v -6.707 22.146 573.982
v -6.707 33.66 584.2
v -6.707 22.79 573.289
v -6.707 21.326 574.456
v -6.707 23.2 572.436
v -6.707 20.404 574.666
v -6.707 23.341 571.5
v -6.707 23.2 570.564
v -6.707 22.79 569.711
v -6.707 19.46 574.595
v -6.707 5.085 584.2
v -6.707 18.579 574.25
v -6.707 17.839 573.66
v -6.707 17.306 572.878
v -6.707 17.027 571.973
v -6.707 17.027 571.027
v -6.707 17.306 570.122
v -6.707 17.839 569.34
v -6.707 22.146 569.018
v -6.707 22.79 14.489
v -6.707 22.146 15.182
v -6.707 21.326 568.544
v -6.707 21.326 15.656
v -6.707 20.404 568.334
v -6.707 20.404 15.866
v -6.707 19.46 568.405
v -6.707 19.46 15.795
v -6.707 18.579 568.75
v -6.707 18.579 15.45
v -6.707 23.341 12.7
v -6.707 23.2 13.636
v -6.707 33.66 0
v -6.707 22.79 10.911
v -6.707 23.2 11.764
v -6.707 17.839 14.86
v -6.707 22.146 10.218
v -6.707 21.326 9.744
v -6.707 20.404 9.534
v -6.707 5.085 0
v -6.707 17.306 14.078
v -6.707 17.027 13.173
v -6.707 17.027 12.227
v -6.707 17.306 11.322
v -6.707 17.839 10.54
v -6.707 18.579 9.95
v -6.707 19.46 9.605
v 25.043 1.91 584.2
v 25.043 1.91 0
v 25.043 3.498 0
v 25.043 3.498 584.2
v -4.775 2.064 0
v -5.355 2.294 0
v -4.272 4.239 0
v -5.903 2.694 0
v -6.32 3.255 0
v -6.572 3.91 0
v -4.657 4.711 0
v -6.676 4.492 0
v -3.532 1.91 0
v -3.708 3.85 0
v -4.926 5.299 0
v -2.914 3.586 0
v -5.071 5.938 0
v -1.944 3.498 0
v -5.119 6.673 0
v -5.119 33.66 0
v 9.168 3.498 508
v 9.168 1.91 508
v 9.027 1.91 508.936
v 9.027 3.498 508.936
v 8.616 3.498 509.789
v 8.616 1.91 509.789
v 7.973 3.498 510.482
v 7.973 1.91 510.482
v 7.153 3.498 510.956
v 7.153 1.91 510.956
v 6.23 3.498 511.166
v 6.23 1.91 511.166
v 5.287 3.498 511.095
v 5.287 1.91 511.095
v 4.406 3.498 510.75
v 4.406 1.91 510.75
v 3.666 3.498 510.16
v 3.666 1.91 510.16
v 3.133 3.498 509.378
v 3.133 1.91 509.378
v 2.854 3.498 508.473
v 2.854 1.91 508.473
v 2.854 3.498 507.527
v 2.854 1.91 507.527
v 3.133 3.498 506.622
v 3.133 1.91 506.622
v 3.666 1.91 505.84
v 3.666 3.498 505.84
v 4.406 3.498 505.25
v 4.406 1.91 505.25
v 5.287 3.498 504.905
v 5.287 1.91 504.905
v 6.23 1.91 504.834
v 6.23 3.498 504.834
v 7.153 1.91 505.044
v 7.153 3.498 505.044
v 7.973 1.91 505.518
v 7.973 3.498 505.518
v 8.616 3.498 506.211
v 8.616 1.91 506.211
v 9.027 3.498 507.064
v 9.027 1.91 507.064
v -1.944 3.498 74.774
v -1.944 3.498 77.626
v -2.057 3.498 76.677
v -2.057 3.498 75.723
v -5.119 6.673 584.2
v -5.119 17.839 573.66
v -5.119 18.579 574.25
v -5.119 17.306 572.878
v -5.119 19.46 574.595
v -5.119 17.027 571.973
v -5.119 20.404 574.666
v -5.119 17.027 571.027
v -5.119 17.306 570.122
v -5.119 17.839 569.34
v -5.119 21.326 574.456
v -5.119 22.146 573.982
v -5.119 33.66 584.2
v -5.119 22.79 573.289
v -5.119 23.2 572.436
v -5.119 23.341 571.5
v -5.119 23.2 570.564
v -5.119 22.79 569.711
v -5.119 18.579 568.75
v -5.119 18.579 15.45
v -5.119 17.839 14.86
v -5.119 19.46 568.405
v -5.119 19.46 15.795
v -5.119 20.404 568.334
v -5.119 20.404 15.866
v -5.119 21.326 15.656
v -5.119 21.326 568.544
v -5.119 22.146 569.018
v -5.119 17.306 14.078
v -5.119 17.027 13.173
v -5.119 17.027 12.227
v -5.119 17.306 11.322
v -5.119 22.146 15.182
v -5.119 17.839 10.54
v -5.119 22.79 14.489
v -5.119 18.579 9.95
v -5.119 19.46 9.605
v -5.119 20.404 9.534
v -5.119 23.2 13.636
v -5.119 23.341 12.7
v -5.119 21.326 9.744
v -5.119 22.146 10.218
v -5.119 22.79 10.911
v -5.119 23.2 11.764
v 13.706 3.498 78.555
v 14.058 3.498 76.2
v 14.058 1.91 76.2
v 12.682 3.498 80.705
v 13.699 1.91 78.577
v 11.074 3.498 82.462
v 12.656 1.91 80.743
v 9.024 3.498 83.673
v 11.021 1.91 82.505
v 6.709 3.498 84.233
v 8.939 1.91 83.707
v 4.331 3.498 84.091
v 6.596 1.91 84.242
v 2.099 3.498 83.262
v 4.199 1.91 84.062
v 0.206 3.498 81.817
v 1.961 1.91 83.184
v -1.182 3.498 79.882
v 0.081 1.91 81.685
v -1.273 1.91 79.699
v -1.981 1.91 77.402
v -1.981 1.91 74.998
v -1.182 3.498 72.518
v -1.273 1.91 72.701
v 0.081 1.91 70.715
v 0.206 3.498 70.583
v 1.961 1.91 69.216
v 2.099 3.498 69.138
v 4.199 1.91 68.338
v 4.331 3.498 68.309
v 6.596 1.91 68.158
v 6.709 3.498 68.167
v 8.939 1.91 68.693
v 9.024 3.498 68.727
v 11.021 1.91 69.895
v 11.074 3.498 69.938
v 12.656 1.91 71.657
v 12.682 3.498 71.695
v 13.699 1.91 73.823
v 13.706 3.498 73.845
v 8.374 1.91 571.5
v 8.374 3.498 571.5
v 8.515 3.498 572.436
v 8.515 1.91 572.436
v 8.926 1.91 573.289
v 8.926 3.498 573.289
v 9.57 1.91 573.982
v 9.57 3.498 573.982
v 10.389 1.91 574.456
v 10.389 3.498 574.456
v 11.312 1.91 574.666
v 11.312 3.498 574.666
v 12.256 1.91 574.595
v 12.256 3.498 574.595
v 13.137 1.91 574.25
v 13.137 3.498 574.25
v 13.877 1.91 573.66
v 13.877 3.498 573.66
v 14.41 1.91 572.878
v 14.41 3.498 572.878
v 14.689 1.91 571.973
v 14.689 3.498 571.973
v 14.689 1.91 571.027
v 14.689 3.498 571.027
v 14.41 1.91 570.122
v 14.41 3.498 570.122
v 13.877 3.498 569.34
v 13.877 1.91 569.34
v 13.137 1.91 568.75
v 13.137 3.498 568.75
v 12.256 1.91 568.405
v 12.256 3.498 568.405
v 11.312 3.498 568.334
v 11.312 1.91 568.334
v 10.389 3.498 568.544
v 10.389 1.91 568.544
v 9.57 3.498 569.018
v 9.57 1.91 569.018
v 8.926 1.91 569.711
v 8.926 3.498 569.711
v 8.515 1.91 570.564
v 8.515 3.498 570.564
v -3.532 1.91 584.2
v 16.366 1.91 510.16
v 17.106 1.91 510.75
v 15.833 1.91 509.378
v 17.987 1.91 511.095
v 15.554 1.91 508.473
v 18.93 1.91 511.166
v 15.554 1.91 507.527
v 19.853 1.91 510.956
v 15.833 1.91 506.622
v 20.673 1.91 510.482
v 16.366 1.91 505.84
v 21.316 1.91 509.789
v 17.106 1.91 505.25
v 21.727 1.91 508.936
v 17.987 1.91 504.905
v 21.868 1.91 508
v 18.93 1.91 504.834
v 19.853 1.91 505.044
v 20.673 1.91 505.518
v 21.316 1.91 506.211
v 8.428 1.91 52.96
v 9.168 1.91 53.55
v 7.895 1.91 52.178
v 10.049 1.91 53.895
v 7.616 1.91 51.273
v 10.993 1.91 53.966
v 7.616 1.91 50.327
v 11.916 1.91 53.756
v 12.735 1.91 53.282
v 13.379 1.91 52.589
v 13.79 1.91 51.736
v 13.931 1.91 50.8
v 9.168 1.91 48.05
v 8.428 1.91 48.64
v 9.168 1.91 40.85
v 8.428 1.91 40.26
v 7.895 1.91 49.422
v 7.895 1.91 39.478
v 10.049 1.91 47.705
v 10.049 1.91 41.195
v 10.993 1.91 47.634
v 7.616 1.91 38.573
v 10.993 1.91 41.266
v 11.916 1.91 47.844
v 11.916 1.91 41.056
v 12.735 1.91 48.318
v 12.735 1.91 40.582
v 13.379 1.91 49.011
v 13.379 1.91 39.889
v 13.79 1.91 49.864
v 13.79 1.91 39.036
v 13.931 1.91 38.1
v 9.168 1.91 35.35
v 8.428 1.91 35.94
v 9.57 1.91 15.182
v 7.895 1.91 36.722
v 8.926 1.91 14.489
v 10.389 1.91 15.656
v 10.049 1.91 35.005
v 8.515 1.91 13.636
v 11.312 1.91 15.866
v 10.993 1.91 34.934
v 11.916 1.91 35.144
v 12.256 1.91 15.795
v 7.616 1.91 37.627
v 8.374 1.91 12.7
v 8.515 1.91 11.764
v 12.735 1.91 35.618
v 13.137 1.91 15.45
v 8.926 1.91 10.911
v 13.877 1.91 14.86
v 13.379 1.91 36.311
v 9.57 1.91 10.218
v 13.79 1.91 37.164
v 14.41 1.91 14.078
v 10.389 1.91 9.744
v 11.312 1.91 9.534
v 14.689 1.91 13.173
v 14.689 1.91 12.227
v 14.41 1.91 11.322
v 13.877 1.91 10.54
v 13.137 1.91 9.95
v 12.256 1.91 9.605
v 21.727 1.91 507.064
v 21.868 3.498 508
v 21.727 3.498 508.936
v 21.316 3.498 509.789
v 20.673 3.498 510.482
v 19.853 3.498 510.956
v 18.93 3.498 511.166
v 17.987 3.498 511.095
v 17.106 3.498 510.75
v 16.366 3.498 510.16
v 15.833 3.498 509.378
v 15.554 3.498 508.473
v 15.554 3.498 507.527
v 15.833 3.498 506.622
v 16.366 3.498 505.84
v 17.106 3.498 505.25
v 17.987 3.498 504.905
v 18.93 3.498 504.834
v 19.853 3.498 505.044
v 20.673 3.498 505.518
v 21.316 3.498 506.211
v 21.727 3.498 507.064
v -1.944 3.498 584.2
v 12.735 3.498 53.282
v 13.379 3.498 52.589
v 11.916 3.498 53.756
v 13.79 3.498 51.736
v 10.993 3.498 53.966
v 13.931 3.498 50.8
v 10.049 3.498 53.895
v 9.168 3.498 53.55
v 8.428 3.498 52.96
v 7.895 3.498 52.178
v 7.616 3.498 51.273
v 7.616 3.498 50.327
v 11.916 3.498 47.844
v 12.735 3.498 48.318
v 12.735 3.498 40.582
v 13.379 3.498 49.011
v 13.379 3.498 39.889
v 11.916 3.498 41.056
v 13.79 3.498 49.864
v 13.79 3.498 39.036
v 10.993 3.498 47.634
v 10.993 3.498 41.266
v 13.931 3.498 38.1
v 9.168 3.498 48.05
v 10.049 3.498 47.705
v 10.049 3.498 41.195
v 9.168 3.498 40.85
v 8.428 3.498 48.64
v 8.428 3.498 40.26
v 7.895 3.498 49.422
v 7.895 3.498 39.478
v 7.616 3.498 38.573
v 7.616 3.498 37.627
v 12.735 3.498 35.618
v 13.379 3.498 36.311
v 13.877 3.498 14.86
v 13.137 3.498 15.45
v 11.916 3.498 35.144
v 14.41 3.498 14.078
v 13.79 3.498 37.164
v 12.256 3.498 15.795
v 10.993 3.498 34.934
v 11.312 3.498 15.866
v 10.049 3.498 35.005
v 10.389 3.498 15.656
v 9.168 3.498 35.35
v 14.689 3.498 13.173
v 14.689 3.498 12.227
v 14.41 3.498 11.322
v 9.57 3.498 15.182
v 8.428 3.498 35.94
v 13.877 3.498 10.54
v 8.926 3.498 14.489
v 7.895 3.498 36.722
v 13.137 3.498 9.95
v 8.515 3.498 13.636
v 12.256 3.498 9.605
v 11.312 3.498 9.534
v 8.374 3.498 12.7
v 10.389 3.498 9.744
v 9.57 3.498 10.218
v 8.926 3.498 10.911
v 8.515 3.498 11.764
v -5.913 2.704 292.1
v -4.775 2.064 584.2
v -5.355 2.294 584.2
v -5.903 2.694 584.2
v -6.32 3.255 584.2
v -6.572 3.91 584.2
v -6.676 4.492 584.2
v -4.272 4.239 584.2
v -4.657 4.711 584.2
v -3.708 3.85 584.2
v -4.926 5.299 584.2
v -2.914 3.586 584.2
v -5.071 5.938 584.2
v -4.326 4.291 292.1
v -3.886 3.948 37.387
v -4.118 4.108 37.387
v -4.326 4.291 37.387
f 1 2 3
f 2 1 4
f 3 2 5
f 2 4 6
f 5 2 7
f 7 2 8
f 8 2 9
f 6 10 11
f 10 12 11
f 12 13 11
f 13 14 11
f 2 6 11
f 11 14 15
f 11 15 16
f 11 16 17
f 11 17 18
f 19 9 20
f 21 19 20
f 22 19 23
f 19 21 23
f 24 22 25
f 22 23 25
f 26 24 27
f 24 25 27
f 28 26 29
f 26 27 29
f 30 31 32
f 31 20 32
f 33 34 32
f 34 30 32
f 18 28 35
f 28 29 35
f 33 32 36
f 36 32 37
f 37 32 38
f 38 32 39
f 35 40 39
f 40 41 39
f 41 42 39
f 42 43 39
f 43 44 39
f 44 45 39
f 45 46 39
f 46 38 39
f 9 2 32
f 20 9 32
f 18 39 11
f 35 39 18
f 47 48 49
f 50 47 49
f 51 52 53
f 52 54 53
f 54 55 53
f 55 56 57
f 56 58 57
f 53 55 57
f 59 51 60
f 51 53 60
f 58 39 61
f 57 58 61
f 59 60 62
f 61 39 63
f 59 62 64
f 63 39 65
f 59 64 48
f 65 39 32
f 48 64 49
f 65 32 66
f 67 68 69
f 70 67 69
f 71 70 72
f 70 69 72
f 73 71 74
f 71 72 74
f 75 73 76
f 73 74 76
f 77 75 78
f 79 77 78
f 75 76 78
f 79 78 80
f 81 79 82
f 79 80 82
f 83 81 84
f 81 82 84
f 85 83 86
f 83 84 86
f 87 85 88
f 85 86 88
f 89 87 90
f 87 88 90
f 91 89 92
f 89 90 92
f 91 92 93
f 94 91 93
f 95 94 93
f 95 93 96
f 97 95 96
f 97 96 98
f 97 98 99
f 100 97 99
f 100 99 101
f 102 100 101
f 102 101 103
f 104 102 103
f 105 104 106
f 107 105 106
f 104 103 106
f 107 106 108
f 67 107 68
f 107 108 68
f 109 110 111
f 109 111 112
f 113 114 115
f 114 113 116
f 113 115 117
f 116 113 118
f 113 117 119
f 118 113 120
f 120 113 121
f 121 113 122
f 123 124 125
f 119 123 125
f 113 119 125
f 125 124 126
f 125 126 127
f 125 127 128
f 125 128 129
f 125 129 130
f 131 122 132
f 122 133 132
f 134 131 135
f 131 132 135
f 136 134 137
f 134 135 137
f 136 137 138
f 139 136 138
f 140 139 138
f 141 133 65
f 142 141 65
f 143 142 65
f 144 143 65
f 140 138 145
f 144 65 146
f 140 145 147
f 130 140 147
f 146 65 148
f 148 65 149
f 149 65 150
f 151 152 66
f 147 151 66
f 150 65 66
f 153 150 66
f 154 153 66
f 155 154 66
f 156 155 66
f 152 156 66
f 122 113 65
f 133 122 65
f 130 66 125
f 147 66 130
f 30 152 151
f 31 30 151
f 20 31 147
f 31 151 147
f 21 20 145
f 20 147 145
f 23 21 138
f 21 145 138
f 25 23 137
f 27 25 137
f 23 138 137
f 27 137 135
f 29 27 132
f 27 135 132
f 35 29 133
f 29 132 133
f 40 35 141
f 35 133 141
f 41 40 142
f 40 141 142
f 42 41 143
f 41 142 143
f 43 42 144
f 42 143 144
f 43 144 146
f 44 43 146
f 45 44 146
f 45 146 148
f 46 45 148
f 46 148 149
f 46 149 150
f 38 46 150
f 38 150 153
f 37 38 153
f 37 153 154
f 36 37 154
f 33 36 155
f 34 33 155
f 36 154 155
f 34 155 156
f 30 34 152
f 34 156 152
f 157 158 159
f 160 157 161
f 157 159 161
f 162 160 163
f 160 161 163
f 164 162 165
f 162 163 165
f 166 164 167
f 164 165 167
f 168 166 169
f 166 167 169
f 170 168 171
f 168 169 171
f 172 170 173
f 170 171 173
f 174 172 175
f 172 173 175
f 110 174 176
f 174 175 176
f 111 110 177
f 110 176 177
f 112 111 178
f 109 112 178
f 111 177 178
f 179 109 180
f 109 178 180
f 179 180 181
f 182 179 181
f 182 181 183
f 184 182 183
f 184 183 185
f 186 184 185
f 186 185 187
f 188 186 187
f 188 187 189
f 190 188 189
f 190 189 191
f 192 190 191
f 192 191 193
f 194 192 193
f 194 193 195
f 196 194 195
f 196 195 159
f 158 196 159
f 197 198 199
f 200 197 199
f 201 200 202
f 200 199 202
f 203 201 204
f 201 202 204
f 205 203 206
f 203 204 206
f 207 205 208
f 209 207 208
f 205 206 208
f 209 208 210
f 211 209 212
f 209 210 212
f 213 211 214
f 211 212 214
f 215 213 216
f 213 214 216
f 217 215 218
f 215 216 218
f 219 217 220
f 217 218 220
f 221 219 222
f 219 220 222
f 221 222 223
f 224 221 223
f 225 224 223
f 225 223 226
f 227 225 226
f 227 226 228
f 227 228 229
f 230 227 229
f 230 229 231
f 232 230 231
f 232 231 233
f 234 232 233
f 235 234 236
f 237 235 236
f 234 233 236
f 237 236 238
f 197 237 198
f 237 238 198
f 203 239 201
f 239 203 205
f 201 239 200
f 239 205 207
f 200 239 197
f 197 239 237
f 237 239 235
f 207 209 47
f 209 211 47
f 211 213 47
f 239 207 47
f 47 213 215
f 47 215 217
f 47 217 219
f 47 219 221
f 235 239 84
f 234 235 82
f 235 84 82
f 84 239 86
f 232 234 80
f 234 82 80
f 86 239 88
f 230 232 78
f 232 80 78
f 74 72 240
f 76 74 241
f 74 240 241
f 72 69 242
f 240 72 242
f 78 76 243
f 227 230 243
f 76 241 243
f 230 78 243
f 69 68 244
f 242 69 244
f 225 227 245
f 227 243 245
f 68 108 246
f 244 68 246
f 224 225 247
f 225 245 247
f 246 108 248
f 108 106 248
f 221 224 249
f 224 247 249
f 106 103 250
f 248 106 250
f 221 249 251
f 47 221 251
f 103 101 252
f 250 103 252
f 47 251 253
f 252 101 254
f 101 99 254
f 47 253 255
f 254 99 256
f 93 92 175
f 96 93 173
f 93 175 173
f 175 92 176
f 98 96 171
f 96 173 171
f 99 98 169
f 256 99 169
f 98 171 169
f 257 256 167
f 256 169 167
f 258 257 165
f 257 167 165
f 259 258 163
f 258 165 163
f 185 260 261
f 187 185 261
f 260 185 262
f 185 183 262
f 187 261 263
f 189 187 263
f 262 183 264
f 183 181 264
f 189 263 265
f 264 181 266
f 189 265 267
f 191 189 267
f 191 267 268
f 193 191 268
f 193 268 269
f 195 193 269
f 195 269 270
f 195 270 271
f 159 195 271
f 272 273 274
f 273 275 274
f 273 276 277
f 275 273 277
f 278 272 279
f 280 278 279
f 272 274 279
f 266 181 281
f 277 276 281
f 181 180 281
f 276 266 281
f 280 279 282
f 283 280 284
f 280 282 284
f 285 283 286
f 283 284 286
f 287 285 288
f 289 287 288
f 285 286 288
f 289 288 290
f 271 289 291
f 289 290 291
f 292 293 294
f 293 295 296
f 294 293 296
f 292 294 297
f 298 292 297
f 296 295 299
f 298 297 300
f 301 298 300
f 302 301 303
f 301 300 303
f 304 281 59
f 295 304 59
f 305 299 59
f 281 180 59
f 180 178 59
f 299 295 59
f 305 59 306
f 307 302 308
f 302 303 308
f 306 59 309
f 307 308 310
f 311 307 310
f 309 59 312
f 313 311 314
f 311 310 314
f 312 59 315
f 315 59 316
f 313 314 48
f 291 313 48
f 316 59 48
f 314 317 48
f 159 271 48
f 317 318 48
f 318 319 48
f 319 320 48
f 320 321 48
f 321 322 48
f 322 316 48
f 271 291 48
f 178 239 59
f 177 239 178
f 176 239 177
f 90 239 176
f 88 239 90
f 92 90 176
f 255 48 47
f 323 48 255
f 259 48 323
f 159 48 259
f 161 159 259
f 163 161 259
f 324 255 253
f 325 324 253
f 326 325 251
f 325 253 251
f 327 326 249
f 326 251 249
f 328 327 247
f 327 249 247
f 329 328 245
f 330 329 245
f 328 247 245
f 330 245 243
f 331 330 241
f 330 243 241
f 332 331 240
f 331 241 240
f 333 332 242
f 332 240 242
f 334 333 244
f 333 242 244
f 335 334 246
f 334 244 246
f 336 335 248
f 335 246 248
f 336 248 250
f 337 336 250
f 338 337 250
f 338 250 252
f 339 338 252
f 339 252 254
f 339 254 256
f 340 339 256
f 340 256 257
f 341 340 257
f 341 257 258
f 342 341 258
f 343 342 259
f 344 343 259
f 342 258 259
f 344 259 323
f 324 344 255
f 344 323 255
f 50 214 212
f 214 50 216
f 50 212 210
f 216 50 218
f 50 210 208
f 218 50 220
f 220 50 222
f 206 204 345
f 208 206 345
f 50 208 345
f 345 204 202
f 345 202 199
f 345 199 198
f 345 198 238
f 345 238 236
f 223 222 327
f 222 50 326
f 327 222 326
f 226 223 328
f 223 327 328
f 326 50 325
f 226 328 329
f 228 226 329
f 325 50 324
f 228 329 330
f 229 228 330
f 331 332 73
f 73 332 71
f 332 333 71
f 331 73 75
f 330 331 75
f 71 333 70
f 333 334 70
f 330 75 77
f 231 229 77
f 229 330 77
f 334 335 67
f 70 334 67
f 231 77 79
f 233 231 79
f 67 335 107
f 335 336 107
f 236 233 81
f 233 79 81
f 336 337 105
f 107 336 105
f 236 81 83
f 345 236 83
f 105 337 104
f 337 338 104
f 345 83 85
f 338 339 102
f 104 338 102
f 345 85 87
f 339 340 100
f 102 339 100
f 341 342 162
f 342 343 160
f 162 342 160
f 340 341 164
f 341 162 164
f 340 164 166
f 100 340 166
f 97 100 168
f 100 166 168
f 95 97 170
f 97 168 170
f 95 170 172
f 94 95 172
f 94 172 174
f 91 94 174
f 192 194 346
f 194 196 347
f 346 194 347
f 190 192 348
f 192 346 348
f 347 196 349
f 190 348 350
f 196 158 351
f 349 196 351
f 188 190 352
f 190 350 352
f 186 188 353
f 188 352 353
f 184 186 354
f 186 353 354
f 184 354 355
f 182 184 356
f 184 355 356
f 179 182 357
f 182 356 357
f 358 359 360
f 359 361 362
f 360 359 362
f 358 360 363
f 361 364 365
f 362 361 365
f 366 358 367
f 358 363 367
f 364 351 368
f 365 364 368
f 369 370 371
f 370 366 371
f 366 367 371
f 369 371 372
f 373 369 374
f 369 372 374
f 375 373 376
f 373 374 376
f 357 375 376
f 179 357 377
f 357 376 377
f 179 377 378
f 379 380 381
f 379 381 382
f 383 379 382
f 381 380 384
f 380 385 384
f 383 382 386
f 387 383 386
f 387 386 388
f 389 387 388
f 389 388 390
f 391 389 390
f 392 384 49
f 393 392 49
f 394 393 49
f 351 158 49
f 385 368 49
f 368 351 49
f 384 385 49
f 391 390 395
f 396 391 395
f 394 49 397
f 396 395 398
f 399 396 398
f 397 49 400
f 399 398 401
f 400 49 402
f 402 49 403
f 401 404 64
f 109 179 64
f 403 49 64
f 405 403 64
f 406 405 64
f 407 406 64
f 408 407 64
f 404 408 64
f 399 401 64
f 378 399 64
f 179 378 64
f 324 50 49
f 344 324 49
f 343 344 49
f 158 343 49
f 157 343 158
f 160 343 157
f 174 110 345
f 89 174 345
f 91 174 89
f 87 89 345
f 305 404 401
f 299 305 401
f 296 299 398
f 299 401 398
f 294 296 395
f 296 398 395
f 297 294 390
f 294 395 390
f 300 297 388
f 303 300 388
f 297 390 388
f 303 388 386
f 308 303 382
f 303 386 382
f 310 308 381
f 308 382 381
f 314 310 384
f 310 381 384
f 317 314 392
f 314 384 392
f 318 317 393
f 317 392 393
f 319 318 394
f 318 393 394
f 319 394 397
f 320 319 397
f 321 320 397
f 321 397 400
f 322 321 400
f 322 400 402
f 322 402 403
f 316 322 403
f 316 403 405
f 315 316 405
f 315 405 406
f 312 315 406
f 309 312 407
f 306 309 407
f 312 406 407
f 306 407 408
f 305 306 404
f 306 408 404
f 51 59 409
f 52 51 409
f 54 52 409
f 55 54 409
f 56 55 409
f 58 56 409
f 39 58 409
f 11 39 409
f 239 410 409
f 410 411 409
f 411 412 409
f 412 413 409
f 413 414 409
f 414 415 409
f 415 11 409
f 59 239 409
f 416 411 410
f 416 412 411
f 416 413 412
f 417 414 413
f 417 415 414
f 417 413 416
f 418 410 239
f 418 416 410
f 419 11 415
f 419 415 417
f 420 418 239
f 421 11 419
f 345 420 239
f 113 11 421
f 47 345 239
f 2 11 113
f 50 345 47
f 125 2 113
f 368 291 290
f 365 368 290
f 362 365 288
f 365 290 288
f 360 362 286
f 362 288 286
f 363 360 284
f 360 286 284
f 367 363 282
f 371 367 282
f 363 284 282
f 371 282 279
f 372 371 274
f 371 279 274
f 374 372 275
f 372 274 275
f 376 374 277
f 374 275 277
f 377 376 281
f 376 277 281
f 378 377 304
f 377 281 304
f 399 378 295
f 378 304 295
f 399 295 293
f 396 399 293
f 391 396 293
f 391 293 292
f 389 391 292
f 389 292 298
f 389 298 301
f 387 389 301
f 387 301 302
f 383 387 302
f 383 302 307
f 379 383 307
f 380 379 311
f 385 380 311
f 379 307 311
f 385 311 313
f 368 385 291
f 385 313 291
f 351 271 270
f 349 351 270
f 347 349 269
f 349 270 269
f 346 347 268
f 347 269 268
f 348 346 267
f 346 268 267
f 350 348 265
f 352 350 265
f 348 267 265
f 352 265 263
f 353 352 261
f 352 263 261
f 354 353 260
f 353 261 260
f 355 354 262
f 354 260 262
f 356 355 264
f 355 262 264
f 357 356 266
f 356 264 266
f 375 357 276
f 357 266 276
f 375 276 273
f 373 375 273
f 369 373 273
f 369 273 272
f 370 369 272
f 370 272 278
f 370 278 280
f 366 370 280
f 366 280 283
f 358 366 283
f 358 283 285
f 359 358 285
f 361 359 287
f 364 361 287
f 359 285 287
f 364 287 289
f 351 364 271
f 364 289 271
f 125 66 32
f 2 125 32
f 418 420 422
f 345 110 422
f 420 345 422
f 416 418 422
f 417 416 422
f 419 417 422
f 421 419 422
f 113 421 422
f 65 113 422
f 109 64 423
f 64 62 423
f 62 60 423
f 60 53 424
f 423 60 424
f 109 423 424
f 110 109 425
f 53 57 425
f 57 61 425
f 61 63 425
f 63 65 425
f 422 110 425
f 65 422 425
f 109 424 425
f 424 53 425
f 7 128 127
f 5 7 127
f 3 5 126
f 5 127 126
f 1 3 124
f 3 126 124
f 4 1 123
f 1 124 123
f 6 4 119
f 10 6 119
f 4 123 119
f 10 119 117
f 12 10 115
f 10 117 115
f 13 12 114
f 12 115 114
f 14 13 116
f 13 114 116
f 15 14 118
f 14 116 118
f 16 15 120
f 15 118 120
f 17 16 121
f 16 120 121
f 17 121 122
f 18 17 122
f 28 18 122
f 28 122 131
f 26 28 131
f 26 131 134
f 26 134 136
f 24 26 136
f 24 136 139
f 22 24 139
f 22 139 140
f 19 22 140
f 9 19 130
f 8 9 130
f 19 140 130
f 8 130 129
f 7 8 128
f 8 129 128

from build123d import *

# Parameters (mm, degrees)
F1_DEPTH    = 584.2
F2_T1_DEPTH = 584.2
F2_T3_DEPTH = 600.075
F3_R        = 3.175
F4_DEPTH    = 1.5875
F5_R        = 3.175
F6_DEPTH    = 1.5875
F7_R        = 3.175
F8_DEPTH    = 1.5875
F9_R        = 3.175
F10_DEPTH   = 1.5875
F11_R       = 8.0645
F12_DEPTH   = 1.5875


# Not quite as in the source:
# - a fillet or chamfer that OpenCascade refuses, or shapes differently, is made with other operations: its cross-section is extruded or revolved along the edge and cut away or added


with BuildPart() as f1:
    # F0 (on Top) → F1 (new body)
    with BuildSketch(Plane.XY):
        Polygon((-5.119352553, 3.4975720825), (-5.119352553, 33.6600720825), (-6.706852553, 33.6600720825), (-6.706852553, 1.9100720825), (25.043147447, 1.9100720825), (25.043147447, 3.4975720825), align=None)
    extrude(amount=F1_DEPTH)

    # F2: fillet of radius 3.175 on 2 edges, made by hand

    # F2_s2 → F2_t1 (join)
    with BuildSketch(Plane.XY):
        with BuildLine():
            add(Edge.make_bspline(
                [(-1.944352553, 3.4975720825), (-5.119352553, 3.4975720825), (-5.119352553, 6.6725720825)],
                knots=[0, 0, 0, 1, 1, 1], degree=2, weights=[1, 1, 1]))
            Line((-5.119352553, 6.6725720825), (-5.119352553, 3.4975720825))
            Line((-5.119352553, 3.4975720825), (-1.944352553, 3.4975720825))
        make_face()
    extrude(amount=F2_T1_DEPTH)

    # F2_s4 → F2_t3 (cut)
    with BuildSketch(Plane.XY.offset(-7.9375)):
        with BuildLine():
            add(Edge.make_bspline(
                [(-6.706852553, 5.0850720825), (-6.706852553, 1.9100720825), (-3.531852553, 1.9100720825)],
                knots=[0, 0, 0, 1, 1, 1], degree=2, weights=[1, 1, 1]))
            Line((-3.531852553, 1.9100720825), (-6.706852553, 1.9100720825))
            Line((-6.706852553, 1.9100720825), (-6.706852553, 5.0850720825))
        make_face()
    extrude(amount=F2_T3_DEPTH, mode=Mode.SUBTRACT)

    # F3 (on face) → F4 (cut)
    with BuildSketch(Plane.YZ.offset(-5.119352553)):
        with Locations((20.1663220825, 12.7)):
            Circle(F3_R)
        with Locations((20.1663220825, 571.5)):
            Circle(F3_R)
    extrude(amount=-F4_DEPTH, mode=Mode.SUBTRACT)

    # F5 (on face) → F6 (cut)
    with BuildSketch(Plane(origin=(0, 3.4975720825, 0), x_dir=(-1, 0, 0), z_dir=(0, 1, 0))):
        with Locations((-11.549397447, 12.7)):
            Circle(F5_R)
        with Locations((-11.549397447, 571.5)):
            Circle(F5_R)
    extrude(amount=-F6_DEPTH, mode=Mode.SUBTRACT)

    # F7 (on face) → F8 (cut)
    with BuildSketch(Plane.XZ.offset(-1.9100720825)):
        with Locations((5.993147447, 508)):
            Circle(F7_R)
        with Locations((18.693147447, 508)):
            Circle(F7_R)
    extrude(amount=-F8_DEPTH, mode=Mode.SUBTRACT)

    # F9 (on face) → F10 (cut)
    with BuildSketch(Plane.XZ.offset(-1.9100720825)):
        with Locations((10.755647447, 38.1)):
            Circle(F9_R)
        with Locations((10.755647447, 50.8)):
            Circle(F9_R)
    extrude(amount=-F10_DEPTH, mode=Mode.SUBTRACT)

    # F11 (on face) → F12 (cut)
    with BuildSketch(Plane.XZ.offset(-1.9100720825)):
        with Locations((5.993147447, 76.2)):
            Circle(F11_R)
    extrude(amount=-F12_DEPTH, mode=Mode.SUBTRACT)


solid = f1.part
